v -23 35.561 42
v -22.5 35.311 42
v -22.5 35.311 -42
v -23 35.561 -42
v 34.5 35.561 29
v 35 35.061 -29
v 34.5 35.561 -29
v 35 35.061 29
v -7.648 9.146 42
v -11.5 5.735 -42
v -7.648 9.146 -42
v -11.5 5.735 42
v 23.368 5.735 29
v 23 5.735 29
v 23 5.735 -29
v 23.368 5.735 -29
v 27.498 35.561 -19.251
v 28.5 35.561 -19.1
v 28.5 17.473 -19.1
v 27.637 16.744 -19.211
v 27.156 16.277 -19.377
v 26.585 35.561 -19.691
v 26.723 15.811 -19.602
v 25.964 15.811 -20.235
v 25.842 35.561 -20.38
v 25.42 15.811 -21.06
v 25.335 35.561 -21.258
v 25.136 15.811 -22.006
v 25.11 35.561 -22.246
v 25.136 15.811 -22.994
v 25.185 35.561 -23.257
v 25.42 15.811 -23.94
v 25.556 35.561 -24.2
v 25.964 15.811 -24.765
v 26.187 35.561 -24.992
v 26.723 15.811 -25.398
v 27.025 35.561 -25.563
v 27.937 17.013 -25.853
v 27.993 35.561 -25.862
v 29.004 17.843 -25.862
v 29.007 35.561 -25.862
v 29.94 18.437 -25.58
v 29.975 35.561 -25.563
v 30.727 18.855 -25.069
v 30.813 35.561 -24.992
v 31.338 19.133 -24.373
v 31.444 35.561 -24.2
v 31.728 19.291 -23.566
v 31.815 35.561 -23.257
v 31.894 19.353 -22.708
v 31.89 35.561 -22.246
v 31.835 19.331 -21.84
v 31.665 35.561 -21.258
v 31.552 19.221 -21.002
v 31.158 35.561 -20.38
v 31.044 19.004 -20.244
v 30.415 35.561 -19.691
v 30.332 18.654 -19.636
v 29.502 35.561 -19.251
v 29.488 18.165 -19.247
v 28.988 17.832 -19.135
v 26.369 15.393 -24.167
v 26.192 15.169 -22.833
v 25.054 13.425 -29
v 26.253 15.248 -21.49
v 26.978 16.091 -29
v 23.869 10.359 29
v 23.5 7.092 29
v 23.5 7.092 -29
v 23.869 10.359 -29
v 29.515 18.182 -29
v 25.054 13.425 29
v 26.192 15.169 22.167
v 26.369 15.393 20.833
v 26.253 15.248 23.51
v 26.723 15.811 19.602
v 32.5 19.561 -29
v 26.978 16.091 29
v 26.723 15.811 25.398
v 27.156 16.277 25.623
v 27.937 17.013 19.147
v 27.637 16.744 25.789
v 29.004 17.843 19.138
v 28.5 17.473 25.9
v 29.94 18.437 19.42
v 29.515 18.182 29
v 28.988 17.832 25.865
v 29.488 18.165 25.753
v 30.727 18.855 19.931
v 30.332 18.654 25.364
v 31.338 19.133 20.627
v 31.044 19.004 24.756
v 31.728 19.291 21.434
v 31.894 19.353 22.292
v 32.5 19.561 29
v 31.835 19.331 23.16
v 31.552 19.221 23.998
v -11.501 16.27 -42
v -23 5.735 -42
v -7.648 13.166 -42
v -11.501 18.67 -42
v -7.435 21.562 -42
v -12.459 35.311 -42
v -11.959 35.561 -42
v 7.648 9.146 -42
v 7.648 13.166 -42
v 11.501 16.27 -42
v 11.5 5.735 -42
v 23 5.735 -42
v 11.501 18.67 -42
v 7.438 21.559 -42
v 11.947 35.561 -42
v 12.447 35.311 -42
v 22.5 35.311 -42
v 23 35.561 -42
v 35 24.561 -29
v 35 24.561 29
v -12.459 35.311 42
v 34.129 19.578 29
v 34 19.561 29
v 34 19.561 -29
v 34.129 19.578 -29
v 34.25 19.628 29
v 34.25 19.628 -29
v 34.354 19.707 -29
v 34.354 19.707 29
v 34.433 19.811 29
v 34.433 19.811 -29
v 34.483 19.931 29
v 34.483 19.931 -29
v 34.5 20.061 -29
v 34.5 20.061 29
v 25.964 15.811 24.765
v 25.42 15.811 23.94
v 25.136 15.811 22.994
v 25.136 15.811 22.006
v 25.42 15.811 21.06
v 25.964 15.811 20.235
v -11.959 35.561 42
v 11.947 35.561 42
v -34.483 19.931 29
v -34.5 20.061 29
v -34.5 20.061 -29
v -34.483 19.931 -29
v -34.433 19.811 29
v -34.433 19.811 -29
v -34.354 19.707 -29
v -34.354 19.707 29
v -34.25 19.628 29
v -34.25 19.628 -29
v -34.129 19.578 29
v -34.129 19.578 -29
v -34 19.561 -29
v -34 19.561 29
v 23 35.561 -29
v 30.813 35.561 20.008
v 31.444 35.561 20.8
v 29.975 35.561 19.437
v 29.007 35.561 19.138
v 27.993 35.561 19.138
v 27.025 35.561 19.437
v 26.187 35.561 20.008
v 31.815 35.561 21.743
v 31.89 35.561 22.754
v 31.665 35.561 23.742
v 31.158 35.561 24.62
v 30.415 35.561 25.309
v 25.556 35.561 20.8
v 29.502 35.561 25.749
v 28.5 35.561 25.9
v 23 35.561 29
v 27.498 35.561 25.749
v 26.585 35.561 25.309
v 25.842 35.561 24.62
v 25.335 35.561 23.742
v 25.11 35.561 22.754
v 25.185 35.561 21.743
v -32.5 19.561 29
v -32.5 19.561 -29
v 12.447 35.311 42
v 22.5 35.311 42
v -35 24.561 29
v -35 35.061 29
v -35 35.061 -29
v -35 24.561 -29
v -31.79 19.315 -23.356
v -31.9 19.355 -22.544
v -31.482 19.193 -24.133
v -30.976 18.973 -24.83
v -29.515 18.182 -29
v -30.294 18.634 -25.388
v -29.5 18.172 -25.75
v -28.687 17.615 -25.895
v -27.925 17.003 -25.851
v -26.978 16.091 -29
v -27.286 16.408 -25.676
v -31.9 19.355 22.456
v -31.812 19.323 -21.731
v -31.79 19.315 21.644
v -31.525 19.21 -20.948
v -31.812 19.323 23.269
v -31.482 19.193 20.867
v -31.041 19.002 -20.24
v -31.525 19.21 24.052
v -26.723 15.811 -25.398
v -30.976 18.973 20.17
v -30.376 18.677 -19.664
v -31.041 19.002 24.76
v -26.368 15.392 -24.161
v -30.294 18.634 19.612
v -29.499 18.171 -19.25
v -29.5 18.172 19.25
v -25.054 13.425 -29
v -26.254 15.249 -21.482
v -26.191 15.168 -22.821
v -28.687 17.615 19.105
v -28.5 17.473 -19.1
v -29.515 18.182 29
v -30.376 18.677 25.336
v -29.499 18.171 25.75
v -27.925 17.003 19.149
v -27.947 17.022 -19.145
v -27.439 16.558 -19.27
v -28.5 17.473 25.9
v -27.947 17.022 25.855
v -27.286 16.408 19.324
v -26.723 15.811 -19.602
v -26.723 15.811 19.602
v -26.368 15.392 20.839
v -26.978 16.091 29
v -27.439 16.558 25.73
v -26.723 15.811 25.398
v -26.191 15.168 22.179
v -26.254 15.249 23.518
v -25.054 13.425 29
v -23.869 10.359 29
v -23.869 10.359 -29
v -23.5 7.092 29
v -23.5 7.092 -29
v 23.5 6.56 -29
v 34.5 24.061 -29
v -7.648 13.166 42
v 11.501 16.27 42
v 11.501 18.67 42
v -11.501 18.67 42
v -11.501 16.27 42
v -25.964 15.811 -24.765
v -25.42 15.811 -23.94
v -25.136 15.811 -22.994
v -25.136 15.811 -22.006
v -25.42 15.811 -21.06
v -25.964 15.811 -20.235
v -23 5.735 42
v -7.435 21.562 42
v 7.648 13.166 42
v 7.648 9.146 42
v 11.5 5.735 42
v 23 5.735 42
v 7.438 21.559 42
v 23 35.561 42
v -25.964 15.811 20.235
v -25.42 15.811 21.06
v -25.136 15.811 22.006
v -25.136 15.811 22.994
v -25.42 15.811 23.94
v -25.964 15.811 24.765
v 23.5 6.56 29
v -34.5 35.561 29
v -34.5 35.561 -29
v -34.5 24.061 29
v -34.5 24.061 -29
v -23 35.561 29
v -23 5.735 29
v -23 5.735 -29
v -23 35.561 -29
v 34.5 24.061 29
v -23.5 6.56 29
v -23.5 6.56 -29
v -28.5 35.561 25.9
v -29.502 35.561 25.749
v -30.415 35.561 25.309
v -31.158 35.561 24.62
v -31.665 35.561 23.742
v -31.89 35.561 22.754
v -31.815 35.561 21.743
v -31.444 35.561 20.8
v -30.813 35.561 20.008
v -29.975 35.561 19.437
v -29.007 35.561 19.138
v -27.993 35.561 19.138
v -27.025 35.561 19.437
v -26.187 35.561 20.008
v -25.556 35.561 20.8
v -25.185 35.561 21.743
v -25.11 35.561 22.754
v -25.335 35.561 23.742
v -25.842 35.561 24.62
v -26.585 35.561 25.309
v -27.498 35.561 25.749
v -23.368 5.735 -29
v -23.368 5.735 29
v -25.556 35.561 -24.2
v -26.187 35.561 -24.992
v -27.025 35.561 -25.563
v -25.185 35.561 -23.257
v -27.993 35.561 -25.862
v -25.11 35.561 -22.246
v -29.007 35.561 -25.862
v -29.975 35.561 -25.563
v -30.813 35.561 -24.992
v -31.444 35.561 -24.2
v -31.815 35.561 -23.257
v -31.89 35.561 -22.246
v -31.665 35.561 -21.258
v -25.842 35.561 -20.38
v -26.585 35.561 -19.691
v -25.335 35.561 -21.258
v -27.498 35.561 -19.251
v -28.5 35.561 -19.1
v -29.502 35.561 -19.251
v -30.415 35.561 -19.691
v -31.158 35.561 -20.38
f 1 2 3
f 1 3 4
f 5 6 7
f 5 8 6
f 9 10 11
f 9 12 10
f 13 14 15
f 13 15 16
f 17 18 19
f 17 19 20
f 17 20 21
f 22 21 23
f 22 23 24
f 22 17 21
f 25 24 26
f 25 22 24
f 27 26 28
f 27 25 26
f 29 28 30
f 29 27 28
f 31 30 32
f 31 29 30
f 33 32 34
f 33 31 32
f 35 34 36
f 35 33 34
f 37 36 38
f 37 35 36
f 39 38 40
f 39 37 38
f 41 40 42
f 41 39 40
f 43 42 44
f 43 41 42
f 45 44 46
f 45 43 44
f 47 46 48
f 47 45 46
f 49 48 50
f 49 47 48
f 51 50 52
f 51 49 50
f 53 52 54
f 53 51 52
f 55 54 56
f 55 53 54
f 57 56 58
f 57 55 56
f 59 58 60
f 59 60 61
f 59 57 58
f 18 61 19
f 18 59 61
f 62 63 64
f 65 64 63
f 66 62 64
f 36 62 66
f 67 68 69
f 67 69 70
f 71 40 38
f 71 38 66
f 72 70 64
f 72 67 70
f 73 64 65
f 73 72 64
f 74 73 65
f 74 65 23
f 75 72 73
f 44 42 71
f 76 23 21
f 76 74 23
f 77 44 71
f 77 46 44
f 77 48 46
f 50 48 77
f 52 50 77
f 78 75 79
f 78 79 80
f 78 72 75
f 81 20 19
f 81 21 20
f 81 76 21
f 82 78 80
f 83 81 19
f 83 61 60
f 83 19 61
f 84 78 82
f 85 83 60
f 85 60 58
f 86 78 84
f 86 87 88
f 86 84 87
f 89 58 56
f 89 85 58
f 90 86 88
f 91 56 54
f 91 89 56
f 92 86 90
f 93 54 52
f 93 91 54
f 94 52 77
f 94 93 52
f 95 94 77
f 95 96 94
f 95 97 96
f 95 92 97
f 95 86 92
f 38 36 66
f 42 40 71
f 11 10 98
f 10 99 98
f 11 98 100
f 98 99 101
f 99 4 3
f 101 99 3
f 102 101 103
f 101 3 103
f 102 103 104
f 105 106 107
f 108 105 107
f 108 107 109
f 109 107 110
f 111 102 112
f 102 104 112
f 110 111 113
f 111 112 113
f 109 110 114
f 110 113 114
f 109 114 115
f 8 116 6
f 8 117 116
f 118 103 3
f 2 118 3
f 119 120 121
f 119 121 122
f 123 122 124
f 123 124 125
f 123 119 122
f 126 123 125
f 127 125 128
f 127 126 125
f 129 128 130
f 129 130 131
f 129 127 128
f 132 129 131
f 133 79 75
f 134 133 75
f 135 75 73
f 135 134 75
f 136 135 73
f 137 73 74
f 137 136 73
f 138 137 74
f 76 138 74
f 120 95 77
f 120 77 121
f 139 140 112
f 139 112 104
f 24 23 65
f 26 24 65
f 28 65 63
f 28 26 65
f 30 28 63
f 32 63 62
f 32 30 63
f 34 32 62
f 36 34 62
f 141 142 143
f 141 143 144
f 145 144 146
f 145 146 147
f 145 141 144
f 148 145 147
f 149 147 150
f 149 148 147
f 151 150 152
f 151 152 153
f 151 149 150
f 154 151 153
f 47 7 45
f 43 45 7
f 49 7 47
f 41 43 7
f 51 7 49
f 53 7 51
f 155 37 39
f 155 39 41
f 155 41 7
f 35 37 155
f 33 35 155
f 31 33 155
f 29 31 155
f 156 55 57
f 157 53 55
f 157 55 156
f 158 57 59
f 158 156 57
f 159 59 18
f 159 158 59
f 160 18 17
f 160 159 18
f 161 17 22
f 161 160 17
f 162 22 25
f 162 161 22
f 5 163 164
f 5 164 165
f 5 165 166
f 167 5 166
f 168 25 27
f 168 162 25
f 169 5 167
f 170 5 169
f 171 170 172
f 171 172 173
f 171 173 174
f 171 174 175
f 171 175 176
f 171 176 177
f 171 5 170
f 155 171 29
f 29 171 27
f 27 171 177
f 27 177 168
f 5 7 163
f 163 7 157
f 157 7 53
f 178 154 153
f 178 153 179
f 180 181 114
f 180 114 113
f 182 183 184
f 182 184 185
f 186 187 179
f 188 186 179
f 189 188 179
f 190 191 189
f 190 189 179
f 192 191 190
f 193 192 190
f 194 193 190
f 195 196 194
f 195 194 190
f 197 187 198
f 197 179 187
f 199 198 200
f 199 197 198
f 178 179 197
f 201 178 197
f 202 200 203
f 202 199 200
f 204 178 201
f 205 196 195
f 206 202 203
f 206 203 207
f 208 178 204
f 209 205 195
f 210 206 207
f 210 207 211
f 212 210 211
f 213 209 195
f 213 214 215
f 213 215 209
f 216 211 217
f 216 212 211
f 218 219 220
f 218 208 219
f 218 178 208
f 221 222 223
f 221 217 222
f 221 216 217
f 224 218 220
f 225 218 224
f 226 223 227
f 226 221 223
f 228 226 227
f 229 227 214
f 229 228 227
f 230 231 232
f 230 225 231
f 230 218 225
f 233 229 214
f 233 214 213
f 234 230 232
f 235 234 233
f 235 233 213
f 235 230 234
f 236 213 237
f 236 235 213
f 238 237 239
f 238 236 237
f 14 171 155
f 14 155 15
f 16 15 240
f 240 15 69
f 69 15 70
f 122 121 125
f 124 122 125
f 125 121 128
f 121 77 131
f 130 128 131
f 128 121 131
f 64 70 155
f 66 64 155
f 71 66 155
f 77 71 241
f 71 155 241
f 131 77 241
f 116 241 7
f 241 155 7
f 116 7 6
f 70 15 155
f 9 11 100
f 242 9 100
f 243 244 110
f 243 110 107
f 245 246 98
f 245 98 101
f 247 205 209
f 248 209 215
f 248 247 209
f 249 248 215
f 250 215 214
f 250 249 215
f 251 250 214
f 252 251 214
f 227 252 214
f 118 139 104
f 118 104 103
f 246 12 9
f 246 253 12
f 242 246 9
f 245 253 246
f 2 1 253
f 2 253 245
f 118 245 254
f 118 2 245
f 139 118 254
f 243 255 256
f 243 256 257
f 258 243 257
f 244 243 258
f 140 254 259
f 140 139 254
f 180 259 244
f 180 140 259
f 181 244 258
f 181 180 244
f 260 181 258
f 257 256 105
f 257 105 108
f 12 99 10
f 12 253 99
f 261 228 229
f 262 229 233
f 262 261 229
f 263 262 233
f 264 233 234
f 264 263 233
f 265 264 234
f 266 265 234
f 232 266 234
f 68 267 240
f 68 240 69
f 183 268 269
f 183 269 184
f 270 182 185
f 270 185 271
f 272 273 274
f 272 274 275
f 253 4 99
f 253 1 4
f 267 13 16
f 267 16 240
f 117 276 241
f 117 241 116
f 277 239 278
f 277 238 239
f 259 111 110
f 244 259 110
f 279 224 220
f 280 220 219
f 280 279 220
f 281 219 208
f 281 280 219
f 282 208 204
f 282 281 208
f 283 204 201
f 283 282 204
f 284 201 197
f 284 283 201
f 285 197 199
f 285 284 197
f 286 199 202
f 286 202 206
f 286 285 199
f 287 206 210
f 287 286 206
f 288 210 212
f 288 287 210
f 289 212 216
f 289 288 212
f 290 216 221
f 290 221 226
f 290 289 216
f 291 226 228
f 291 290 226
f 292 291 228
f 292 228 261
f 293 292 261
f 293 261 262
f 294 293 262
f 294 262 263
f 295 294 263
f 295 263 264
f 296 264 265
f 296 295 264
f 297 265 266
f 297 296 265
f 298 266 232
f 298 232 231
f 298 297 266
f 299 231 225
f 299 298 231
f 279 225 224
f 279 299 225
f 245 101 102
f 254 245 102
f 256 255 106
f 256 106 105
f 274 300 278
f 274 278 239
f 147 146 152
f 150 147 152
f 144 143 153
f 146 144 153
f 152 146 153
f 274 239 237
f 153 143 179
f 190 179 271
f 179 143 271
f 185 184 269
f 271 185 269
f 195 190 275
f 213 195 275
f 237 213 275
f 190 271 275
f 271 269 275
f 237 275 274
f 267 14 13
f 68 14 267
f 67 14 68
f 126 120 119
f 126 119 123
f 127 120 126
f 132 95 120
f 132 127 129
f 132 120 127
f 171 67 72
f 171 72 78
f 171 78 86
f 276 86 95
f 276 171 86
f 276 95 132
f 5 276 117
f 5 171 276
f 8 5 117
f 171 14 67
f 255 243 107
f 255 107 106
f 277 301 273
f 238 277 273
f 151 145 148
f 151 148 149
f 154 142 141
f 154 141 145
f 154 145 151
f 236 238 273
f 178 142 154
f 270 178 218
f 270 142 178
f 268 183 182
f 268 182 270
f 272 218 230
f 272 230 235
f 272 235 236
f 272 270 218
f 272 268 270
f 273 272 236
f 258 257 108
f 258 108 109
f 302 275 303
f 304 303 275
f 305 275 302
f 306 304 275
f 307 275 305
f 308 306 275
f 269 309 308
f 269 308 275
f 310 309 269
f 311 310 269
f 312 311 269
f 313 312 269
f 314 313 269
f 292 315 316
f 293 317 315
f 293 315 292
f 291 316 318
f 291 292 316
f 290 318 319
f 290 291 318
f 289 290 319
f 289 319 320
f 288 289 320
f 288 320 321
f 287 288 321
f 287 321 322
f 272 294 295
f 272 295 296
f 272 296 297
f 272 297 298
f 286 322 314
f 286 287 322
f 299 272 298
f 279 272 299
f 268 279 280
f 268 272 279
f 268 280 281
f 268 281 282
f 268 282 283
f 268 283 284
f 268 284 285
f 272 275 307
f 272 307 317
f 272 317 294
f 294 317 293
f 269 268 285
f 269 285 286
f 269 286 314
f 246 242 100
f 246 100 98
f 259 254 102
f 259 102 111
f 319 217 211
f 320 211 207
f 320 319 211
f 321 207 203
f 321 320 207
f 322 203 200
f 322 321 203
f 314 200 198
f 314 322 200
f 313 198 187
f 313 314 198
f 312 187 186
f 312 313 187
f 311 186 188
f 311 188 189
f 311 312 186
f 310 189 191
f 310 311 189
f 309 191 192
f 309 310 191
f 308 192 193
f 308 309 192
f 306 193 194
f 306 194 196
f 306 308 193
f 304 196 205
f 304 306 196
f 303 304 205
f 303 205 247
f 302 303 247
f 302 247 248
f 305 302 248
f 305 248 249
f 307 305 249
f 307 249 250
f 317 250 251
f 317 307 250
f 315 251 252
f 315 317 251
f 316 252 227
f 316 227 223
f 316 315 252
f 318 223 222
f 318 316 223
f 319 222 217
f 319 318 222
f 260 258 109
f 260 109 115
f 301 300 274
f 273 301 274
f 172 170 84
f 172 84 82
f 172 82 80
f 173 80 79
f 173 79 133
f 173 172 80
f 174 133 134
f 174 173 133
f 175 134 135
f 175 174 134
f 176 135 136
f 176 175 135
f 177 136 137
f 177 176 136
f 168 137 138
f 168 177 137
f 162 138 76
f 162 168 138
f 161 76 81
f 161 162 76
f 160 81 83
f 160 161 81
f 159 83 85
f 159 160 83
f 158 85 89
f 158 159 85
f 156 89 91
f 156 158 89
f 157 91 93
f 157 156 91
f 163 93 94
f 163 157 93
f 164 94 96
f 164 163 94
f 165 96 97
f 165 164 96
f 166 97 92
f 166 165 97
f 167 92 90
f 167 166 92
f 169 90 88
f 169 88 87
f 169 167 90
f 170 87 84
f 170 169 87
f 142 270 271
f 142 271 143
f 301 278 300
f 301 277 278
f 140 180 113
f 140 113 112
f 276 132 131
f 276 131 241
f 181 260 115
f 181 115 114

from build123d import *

# Parameters (mm, degrees)
EXTRUDE_1_DEPTH             = 42
EXTRUDE_2_DEPTH             = 29
EXTRUDE_2_2_DEPTH           = 29
HOLE_WIZARD_M8_1_AT_2_COUNT = 2
HOLE_WIZARD_M8_1_AT_2_PITCH = 45
HOLE_WIZARD_M8_1_AT_3_COUNT = 2
HOLE_WIZARD_M8_1_AT_3_PITCH = 72.622310621
HOLE_WIZARD_M8_1_AT_4_COUNT = 2
HOLE_WIZARD_M8_1_AT_4_PITCH = 57


with BuildPart() as part:
    # 草图1 → 凸台-拉伸1 (new, symmetric)
    with BuildSketch(Plane.XY):
        Polygon((-11.500091475, 5.734955537), (-7.647732558, 9.145638929), (-7.647727428, 13.16613519), (-11.50123169, 16.269719689), (-11.50123169, 18.669719689), (-7.435273395, 21.561714335), (7.43839537, 21.559493767), (11.50123169, 18.669719689), (11.50123169, 16.269719689), (7.647727428, 13.16613519), (7.647732558, 9.145638929), (11.500075136, 5.734970004), (22.999625955, 5.734825788), (23, 35.560596819), (22.5, 35.310596819), (12.447093803, 35.310596819), (11.947093803, 35.560596819), (-11.958571704, 35.560596819), (-12.458571704, 35.310596819), (-22.5, 35.310596819), (-23, 35.560596819), (-22.999625953, 5.734681137), align=None)
    extrude(amount=EXTRUDE_1_DEPTH, both=True)


with BuildPart() as body_2:
    # 草图1<5> → 凸台-拉伸2 (new, symmetric)
    with BuildSketch(Plane.XY):
        with BuildLine():
            Line((34.5, 35.560596819), (23, 35.560596819))
            Line((23, 35.560596819), (22.999625955, 5.734825788))
            Line((22.999625955, 5.734825788), (23.367770173, 5.734821171))
            Line((23.367770173, 5.734821171), (23.5, 6.560414048))
            Line((23.5, 6.560414048), (23.5, 7.09172117))
            ThreePointArc((23.5, 7.09172117), (25.930470263, 14.819939841), (32.5, 19.560596819))
            Line((32.5, 19.560596819), (34, 19.560596819))
            ThreePointArc((34, 19.560596819), (34.353553391, 19.707043429), (34.5, 20.060596819))
            Line((34.5, 20.060596819), (34.5, 24.060596819))
            Line((34.5, 24.060596819), (35, 24.560596819))
            Line((35, 24.560596819), (35, 35.060596819))
            Line((35, 35.060596819), (34.5, 35.560596819))
        make_face()
    extrude(amount=EXTRUDE_2_DEPTH, both=True)


with BuildPart() as body_3:
    # 草图1<5> → Extrude 2 2 (new, symmetric)
    with BuildSketch(Plane.XY):
        with BuildLine():
            Line((-23.367949599, 5.734672349), (-22.999625953, 5.734681137))
            Line((-22.999625953, 5.734681137), (-23, 35.560596819))
            Line((-23, 35.560596819), (-34.5, 35.560596819))
            Line((-34.5, 35.560596819), (-35, 35.060596819))
            Line((-35, 35.060596819), (-35, 24.560596819))
            Line((-35, 24.560596819), (-34.5, 24.060596819))
            Line((-34.5, 24.060596819), (-34.5, 20.060596819))
            ThreePointArc((-34.5, 20.060596819), (-34.353553391, 19.707043429), (-34, 19.560596819))
            Line((-34, 19.560596819), (-32.5, 19.560596819))
            ThreePointArc((-32.5, 19.560596819), (-25.930470263, 14.819939841), (-23.5, 7.09172117))
            Line((-23.5, 7.09172117), (-23.5, 6.560414048))
            Line((-23.5, 6.560414048), (-23.367949599, 5.734672349))
        make_face()
    extrude(amount=EXTRUDE_2_2_DEPTH, both=True)

    # 草图2 → M8 螺纹孔1 (revolve, cut)
    with BuildSketch(Plane(origin=(-28.5, 35.560596819, 22.5), x_dir=(0, 0, 1), z_dir=(1, 0, 0))):
        Polygon((0, 0), (0, 21.792926105), (3.4, 19.75), (3.4, 0), align=None)
    hole_wizard_m8_1 = revolve(axis=Axis((-28.5, 41.910596819, 22.5), (0, -1, 0)), mode=Mode.SUBTRACT)

    # M8 螺纹孔1 at 2: M8 螺纹孔1 ×2
    with Locations(*[(0, 0, -i * HOLE_WIZARD_M8_1_AT_2_PITCH) for i in range(1, HOLE_WIZARD_M8_1_AT_2_COUNT)]):
        add(hole_wizard_m8_1, mode=Mode.SUBTRACT)


with BuildPart() as body_2_1:
    add(body_2.part)

    # M8 螺纹孔1 at 3: M8 螺纹孔1 ×2
    with Locations(*[Vector(0.7848827655334262, 0, -0.6196442885790209) * (i * HOLE_WIZARD_M8_1_AT_3_PITCH) for i in range(1, HOLE_WIZARD_M8_1_AT_3_COUNT)]):
        add(hole_wizard_m8_1, mode=Mode.SUBTRACT)

    # M8 螺纹孔1 at 4: M8 螺纹孔1 ×2
    with Locations(*[(i * HOLE_WIZARD_M8_1_AT_4_PITCH, 0, 0) for i in range(1, HOLE_WIZARD_M8_1_AT_4_COUNT)]):
        add(hole_wizard_m8_1, mode=Mode.SUBTRACT)


solid = Compound([part.part, body_3.part, body_2_1.part])
